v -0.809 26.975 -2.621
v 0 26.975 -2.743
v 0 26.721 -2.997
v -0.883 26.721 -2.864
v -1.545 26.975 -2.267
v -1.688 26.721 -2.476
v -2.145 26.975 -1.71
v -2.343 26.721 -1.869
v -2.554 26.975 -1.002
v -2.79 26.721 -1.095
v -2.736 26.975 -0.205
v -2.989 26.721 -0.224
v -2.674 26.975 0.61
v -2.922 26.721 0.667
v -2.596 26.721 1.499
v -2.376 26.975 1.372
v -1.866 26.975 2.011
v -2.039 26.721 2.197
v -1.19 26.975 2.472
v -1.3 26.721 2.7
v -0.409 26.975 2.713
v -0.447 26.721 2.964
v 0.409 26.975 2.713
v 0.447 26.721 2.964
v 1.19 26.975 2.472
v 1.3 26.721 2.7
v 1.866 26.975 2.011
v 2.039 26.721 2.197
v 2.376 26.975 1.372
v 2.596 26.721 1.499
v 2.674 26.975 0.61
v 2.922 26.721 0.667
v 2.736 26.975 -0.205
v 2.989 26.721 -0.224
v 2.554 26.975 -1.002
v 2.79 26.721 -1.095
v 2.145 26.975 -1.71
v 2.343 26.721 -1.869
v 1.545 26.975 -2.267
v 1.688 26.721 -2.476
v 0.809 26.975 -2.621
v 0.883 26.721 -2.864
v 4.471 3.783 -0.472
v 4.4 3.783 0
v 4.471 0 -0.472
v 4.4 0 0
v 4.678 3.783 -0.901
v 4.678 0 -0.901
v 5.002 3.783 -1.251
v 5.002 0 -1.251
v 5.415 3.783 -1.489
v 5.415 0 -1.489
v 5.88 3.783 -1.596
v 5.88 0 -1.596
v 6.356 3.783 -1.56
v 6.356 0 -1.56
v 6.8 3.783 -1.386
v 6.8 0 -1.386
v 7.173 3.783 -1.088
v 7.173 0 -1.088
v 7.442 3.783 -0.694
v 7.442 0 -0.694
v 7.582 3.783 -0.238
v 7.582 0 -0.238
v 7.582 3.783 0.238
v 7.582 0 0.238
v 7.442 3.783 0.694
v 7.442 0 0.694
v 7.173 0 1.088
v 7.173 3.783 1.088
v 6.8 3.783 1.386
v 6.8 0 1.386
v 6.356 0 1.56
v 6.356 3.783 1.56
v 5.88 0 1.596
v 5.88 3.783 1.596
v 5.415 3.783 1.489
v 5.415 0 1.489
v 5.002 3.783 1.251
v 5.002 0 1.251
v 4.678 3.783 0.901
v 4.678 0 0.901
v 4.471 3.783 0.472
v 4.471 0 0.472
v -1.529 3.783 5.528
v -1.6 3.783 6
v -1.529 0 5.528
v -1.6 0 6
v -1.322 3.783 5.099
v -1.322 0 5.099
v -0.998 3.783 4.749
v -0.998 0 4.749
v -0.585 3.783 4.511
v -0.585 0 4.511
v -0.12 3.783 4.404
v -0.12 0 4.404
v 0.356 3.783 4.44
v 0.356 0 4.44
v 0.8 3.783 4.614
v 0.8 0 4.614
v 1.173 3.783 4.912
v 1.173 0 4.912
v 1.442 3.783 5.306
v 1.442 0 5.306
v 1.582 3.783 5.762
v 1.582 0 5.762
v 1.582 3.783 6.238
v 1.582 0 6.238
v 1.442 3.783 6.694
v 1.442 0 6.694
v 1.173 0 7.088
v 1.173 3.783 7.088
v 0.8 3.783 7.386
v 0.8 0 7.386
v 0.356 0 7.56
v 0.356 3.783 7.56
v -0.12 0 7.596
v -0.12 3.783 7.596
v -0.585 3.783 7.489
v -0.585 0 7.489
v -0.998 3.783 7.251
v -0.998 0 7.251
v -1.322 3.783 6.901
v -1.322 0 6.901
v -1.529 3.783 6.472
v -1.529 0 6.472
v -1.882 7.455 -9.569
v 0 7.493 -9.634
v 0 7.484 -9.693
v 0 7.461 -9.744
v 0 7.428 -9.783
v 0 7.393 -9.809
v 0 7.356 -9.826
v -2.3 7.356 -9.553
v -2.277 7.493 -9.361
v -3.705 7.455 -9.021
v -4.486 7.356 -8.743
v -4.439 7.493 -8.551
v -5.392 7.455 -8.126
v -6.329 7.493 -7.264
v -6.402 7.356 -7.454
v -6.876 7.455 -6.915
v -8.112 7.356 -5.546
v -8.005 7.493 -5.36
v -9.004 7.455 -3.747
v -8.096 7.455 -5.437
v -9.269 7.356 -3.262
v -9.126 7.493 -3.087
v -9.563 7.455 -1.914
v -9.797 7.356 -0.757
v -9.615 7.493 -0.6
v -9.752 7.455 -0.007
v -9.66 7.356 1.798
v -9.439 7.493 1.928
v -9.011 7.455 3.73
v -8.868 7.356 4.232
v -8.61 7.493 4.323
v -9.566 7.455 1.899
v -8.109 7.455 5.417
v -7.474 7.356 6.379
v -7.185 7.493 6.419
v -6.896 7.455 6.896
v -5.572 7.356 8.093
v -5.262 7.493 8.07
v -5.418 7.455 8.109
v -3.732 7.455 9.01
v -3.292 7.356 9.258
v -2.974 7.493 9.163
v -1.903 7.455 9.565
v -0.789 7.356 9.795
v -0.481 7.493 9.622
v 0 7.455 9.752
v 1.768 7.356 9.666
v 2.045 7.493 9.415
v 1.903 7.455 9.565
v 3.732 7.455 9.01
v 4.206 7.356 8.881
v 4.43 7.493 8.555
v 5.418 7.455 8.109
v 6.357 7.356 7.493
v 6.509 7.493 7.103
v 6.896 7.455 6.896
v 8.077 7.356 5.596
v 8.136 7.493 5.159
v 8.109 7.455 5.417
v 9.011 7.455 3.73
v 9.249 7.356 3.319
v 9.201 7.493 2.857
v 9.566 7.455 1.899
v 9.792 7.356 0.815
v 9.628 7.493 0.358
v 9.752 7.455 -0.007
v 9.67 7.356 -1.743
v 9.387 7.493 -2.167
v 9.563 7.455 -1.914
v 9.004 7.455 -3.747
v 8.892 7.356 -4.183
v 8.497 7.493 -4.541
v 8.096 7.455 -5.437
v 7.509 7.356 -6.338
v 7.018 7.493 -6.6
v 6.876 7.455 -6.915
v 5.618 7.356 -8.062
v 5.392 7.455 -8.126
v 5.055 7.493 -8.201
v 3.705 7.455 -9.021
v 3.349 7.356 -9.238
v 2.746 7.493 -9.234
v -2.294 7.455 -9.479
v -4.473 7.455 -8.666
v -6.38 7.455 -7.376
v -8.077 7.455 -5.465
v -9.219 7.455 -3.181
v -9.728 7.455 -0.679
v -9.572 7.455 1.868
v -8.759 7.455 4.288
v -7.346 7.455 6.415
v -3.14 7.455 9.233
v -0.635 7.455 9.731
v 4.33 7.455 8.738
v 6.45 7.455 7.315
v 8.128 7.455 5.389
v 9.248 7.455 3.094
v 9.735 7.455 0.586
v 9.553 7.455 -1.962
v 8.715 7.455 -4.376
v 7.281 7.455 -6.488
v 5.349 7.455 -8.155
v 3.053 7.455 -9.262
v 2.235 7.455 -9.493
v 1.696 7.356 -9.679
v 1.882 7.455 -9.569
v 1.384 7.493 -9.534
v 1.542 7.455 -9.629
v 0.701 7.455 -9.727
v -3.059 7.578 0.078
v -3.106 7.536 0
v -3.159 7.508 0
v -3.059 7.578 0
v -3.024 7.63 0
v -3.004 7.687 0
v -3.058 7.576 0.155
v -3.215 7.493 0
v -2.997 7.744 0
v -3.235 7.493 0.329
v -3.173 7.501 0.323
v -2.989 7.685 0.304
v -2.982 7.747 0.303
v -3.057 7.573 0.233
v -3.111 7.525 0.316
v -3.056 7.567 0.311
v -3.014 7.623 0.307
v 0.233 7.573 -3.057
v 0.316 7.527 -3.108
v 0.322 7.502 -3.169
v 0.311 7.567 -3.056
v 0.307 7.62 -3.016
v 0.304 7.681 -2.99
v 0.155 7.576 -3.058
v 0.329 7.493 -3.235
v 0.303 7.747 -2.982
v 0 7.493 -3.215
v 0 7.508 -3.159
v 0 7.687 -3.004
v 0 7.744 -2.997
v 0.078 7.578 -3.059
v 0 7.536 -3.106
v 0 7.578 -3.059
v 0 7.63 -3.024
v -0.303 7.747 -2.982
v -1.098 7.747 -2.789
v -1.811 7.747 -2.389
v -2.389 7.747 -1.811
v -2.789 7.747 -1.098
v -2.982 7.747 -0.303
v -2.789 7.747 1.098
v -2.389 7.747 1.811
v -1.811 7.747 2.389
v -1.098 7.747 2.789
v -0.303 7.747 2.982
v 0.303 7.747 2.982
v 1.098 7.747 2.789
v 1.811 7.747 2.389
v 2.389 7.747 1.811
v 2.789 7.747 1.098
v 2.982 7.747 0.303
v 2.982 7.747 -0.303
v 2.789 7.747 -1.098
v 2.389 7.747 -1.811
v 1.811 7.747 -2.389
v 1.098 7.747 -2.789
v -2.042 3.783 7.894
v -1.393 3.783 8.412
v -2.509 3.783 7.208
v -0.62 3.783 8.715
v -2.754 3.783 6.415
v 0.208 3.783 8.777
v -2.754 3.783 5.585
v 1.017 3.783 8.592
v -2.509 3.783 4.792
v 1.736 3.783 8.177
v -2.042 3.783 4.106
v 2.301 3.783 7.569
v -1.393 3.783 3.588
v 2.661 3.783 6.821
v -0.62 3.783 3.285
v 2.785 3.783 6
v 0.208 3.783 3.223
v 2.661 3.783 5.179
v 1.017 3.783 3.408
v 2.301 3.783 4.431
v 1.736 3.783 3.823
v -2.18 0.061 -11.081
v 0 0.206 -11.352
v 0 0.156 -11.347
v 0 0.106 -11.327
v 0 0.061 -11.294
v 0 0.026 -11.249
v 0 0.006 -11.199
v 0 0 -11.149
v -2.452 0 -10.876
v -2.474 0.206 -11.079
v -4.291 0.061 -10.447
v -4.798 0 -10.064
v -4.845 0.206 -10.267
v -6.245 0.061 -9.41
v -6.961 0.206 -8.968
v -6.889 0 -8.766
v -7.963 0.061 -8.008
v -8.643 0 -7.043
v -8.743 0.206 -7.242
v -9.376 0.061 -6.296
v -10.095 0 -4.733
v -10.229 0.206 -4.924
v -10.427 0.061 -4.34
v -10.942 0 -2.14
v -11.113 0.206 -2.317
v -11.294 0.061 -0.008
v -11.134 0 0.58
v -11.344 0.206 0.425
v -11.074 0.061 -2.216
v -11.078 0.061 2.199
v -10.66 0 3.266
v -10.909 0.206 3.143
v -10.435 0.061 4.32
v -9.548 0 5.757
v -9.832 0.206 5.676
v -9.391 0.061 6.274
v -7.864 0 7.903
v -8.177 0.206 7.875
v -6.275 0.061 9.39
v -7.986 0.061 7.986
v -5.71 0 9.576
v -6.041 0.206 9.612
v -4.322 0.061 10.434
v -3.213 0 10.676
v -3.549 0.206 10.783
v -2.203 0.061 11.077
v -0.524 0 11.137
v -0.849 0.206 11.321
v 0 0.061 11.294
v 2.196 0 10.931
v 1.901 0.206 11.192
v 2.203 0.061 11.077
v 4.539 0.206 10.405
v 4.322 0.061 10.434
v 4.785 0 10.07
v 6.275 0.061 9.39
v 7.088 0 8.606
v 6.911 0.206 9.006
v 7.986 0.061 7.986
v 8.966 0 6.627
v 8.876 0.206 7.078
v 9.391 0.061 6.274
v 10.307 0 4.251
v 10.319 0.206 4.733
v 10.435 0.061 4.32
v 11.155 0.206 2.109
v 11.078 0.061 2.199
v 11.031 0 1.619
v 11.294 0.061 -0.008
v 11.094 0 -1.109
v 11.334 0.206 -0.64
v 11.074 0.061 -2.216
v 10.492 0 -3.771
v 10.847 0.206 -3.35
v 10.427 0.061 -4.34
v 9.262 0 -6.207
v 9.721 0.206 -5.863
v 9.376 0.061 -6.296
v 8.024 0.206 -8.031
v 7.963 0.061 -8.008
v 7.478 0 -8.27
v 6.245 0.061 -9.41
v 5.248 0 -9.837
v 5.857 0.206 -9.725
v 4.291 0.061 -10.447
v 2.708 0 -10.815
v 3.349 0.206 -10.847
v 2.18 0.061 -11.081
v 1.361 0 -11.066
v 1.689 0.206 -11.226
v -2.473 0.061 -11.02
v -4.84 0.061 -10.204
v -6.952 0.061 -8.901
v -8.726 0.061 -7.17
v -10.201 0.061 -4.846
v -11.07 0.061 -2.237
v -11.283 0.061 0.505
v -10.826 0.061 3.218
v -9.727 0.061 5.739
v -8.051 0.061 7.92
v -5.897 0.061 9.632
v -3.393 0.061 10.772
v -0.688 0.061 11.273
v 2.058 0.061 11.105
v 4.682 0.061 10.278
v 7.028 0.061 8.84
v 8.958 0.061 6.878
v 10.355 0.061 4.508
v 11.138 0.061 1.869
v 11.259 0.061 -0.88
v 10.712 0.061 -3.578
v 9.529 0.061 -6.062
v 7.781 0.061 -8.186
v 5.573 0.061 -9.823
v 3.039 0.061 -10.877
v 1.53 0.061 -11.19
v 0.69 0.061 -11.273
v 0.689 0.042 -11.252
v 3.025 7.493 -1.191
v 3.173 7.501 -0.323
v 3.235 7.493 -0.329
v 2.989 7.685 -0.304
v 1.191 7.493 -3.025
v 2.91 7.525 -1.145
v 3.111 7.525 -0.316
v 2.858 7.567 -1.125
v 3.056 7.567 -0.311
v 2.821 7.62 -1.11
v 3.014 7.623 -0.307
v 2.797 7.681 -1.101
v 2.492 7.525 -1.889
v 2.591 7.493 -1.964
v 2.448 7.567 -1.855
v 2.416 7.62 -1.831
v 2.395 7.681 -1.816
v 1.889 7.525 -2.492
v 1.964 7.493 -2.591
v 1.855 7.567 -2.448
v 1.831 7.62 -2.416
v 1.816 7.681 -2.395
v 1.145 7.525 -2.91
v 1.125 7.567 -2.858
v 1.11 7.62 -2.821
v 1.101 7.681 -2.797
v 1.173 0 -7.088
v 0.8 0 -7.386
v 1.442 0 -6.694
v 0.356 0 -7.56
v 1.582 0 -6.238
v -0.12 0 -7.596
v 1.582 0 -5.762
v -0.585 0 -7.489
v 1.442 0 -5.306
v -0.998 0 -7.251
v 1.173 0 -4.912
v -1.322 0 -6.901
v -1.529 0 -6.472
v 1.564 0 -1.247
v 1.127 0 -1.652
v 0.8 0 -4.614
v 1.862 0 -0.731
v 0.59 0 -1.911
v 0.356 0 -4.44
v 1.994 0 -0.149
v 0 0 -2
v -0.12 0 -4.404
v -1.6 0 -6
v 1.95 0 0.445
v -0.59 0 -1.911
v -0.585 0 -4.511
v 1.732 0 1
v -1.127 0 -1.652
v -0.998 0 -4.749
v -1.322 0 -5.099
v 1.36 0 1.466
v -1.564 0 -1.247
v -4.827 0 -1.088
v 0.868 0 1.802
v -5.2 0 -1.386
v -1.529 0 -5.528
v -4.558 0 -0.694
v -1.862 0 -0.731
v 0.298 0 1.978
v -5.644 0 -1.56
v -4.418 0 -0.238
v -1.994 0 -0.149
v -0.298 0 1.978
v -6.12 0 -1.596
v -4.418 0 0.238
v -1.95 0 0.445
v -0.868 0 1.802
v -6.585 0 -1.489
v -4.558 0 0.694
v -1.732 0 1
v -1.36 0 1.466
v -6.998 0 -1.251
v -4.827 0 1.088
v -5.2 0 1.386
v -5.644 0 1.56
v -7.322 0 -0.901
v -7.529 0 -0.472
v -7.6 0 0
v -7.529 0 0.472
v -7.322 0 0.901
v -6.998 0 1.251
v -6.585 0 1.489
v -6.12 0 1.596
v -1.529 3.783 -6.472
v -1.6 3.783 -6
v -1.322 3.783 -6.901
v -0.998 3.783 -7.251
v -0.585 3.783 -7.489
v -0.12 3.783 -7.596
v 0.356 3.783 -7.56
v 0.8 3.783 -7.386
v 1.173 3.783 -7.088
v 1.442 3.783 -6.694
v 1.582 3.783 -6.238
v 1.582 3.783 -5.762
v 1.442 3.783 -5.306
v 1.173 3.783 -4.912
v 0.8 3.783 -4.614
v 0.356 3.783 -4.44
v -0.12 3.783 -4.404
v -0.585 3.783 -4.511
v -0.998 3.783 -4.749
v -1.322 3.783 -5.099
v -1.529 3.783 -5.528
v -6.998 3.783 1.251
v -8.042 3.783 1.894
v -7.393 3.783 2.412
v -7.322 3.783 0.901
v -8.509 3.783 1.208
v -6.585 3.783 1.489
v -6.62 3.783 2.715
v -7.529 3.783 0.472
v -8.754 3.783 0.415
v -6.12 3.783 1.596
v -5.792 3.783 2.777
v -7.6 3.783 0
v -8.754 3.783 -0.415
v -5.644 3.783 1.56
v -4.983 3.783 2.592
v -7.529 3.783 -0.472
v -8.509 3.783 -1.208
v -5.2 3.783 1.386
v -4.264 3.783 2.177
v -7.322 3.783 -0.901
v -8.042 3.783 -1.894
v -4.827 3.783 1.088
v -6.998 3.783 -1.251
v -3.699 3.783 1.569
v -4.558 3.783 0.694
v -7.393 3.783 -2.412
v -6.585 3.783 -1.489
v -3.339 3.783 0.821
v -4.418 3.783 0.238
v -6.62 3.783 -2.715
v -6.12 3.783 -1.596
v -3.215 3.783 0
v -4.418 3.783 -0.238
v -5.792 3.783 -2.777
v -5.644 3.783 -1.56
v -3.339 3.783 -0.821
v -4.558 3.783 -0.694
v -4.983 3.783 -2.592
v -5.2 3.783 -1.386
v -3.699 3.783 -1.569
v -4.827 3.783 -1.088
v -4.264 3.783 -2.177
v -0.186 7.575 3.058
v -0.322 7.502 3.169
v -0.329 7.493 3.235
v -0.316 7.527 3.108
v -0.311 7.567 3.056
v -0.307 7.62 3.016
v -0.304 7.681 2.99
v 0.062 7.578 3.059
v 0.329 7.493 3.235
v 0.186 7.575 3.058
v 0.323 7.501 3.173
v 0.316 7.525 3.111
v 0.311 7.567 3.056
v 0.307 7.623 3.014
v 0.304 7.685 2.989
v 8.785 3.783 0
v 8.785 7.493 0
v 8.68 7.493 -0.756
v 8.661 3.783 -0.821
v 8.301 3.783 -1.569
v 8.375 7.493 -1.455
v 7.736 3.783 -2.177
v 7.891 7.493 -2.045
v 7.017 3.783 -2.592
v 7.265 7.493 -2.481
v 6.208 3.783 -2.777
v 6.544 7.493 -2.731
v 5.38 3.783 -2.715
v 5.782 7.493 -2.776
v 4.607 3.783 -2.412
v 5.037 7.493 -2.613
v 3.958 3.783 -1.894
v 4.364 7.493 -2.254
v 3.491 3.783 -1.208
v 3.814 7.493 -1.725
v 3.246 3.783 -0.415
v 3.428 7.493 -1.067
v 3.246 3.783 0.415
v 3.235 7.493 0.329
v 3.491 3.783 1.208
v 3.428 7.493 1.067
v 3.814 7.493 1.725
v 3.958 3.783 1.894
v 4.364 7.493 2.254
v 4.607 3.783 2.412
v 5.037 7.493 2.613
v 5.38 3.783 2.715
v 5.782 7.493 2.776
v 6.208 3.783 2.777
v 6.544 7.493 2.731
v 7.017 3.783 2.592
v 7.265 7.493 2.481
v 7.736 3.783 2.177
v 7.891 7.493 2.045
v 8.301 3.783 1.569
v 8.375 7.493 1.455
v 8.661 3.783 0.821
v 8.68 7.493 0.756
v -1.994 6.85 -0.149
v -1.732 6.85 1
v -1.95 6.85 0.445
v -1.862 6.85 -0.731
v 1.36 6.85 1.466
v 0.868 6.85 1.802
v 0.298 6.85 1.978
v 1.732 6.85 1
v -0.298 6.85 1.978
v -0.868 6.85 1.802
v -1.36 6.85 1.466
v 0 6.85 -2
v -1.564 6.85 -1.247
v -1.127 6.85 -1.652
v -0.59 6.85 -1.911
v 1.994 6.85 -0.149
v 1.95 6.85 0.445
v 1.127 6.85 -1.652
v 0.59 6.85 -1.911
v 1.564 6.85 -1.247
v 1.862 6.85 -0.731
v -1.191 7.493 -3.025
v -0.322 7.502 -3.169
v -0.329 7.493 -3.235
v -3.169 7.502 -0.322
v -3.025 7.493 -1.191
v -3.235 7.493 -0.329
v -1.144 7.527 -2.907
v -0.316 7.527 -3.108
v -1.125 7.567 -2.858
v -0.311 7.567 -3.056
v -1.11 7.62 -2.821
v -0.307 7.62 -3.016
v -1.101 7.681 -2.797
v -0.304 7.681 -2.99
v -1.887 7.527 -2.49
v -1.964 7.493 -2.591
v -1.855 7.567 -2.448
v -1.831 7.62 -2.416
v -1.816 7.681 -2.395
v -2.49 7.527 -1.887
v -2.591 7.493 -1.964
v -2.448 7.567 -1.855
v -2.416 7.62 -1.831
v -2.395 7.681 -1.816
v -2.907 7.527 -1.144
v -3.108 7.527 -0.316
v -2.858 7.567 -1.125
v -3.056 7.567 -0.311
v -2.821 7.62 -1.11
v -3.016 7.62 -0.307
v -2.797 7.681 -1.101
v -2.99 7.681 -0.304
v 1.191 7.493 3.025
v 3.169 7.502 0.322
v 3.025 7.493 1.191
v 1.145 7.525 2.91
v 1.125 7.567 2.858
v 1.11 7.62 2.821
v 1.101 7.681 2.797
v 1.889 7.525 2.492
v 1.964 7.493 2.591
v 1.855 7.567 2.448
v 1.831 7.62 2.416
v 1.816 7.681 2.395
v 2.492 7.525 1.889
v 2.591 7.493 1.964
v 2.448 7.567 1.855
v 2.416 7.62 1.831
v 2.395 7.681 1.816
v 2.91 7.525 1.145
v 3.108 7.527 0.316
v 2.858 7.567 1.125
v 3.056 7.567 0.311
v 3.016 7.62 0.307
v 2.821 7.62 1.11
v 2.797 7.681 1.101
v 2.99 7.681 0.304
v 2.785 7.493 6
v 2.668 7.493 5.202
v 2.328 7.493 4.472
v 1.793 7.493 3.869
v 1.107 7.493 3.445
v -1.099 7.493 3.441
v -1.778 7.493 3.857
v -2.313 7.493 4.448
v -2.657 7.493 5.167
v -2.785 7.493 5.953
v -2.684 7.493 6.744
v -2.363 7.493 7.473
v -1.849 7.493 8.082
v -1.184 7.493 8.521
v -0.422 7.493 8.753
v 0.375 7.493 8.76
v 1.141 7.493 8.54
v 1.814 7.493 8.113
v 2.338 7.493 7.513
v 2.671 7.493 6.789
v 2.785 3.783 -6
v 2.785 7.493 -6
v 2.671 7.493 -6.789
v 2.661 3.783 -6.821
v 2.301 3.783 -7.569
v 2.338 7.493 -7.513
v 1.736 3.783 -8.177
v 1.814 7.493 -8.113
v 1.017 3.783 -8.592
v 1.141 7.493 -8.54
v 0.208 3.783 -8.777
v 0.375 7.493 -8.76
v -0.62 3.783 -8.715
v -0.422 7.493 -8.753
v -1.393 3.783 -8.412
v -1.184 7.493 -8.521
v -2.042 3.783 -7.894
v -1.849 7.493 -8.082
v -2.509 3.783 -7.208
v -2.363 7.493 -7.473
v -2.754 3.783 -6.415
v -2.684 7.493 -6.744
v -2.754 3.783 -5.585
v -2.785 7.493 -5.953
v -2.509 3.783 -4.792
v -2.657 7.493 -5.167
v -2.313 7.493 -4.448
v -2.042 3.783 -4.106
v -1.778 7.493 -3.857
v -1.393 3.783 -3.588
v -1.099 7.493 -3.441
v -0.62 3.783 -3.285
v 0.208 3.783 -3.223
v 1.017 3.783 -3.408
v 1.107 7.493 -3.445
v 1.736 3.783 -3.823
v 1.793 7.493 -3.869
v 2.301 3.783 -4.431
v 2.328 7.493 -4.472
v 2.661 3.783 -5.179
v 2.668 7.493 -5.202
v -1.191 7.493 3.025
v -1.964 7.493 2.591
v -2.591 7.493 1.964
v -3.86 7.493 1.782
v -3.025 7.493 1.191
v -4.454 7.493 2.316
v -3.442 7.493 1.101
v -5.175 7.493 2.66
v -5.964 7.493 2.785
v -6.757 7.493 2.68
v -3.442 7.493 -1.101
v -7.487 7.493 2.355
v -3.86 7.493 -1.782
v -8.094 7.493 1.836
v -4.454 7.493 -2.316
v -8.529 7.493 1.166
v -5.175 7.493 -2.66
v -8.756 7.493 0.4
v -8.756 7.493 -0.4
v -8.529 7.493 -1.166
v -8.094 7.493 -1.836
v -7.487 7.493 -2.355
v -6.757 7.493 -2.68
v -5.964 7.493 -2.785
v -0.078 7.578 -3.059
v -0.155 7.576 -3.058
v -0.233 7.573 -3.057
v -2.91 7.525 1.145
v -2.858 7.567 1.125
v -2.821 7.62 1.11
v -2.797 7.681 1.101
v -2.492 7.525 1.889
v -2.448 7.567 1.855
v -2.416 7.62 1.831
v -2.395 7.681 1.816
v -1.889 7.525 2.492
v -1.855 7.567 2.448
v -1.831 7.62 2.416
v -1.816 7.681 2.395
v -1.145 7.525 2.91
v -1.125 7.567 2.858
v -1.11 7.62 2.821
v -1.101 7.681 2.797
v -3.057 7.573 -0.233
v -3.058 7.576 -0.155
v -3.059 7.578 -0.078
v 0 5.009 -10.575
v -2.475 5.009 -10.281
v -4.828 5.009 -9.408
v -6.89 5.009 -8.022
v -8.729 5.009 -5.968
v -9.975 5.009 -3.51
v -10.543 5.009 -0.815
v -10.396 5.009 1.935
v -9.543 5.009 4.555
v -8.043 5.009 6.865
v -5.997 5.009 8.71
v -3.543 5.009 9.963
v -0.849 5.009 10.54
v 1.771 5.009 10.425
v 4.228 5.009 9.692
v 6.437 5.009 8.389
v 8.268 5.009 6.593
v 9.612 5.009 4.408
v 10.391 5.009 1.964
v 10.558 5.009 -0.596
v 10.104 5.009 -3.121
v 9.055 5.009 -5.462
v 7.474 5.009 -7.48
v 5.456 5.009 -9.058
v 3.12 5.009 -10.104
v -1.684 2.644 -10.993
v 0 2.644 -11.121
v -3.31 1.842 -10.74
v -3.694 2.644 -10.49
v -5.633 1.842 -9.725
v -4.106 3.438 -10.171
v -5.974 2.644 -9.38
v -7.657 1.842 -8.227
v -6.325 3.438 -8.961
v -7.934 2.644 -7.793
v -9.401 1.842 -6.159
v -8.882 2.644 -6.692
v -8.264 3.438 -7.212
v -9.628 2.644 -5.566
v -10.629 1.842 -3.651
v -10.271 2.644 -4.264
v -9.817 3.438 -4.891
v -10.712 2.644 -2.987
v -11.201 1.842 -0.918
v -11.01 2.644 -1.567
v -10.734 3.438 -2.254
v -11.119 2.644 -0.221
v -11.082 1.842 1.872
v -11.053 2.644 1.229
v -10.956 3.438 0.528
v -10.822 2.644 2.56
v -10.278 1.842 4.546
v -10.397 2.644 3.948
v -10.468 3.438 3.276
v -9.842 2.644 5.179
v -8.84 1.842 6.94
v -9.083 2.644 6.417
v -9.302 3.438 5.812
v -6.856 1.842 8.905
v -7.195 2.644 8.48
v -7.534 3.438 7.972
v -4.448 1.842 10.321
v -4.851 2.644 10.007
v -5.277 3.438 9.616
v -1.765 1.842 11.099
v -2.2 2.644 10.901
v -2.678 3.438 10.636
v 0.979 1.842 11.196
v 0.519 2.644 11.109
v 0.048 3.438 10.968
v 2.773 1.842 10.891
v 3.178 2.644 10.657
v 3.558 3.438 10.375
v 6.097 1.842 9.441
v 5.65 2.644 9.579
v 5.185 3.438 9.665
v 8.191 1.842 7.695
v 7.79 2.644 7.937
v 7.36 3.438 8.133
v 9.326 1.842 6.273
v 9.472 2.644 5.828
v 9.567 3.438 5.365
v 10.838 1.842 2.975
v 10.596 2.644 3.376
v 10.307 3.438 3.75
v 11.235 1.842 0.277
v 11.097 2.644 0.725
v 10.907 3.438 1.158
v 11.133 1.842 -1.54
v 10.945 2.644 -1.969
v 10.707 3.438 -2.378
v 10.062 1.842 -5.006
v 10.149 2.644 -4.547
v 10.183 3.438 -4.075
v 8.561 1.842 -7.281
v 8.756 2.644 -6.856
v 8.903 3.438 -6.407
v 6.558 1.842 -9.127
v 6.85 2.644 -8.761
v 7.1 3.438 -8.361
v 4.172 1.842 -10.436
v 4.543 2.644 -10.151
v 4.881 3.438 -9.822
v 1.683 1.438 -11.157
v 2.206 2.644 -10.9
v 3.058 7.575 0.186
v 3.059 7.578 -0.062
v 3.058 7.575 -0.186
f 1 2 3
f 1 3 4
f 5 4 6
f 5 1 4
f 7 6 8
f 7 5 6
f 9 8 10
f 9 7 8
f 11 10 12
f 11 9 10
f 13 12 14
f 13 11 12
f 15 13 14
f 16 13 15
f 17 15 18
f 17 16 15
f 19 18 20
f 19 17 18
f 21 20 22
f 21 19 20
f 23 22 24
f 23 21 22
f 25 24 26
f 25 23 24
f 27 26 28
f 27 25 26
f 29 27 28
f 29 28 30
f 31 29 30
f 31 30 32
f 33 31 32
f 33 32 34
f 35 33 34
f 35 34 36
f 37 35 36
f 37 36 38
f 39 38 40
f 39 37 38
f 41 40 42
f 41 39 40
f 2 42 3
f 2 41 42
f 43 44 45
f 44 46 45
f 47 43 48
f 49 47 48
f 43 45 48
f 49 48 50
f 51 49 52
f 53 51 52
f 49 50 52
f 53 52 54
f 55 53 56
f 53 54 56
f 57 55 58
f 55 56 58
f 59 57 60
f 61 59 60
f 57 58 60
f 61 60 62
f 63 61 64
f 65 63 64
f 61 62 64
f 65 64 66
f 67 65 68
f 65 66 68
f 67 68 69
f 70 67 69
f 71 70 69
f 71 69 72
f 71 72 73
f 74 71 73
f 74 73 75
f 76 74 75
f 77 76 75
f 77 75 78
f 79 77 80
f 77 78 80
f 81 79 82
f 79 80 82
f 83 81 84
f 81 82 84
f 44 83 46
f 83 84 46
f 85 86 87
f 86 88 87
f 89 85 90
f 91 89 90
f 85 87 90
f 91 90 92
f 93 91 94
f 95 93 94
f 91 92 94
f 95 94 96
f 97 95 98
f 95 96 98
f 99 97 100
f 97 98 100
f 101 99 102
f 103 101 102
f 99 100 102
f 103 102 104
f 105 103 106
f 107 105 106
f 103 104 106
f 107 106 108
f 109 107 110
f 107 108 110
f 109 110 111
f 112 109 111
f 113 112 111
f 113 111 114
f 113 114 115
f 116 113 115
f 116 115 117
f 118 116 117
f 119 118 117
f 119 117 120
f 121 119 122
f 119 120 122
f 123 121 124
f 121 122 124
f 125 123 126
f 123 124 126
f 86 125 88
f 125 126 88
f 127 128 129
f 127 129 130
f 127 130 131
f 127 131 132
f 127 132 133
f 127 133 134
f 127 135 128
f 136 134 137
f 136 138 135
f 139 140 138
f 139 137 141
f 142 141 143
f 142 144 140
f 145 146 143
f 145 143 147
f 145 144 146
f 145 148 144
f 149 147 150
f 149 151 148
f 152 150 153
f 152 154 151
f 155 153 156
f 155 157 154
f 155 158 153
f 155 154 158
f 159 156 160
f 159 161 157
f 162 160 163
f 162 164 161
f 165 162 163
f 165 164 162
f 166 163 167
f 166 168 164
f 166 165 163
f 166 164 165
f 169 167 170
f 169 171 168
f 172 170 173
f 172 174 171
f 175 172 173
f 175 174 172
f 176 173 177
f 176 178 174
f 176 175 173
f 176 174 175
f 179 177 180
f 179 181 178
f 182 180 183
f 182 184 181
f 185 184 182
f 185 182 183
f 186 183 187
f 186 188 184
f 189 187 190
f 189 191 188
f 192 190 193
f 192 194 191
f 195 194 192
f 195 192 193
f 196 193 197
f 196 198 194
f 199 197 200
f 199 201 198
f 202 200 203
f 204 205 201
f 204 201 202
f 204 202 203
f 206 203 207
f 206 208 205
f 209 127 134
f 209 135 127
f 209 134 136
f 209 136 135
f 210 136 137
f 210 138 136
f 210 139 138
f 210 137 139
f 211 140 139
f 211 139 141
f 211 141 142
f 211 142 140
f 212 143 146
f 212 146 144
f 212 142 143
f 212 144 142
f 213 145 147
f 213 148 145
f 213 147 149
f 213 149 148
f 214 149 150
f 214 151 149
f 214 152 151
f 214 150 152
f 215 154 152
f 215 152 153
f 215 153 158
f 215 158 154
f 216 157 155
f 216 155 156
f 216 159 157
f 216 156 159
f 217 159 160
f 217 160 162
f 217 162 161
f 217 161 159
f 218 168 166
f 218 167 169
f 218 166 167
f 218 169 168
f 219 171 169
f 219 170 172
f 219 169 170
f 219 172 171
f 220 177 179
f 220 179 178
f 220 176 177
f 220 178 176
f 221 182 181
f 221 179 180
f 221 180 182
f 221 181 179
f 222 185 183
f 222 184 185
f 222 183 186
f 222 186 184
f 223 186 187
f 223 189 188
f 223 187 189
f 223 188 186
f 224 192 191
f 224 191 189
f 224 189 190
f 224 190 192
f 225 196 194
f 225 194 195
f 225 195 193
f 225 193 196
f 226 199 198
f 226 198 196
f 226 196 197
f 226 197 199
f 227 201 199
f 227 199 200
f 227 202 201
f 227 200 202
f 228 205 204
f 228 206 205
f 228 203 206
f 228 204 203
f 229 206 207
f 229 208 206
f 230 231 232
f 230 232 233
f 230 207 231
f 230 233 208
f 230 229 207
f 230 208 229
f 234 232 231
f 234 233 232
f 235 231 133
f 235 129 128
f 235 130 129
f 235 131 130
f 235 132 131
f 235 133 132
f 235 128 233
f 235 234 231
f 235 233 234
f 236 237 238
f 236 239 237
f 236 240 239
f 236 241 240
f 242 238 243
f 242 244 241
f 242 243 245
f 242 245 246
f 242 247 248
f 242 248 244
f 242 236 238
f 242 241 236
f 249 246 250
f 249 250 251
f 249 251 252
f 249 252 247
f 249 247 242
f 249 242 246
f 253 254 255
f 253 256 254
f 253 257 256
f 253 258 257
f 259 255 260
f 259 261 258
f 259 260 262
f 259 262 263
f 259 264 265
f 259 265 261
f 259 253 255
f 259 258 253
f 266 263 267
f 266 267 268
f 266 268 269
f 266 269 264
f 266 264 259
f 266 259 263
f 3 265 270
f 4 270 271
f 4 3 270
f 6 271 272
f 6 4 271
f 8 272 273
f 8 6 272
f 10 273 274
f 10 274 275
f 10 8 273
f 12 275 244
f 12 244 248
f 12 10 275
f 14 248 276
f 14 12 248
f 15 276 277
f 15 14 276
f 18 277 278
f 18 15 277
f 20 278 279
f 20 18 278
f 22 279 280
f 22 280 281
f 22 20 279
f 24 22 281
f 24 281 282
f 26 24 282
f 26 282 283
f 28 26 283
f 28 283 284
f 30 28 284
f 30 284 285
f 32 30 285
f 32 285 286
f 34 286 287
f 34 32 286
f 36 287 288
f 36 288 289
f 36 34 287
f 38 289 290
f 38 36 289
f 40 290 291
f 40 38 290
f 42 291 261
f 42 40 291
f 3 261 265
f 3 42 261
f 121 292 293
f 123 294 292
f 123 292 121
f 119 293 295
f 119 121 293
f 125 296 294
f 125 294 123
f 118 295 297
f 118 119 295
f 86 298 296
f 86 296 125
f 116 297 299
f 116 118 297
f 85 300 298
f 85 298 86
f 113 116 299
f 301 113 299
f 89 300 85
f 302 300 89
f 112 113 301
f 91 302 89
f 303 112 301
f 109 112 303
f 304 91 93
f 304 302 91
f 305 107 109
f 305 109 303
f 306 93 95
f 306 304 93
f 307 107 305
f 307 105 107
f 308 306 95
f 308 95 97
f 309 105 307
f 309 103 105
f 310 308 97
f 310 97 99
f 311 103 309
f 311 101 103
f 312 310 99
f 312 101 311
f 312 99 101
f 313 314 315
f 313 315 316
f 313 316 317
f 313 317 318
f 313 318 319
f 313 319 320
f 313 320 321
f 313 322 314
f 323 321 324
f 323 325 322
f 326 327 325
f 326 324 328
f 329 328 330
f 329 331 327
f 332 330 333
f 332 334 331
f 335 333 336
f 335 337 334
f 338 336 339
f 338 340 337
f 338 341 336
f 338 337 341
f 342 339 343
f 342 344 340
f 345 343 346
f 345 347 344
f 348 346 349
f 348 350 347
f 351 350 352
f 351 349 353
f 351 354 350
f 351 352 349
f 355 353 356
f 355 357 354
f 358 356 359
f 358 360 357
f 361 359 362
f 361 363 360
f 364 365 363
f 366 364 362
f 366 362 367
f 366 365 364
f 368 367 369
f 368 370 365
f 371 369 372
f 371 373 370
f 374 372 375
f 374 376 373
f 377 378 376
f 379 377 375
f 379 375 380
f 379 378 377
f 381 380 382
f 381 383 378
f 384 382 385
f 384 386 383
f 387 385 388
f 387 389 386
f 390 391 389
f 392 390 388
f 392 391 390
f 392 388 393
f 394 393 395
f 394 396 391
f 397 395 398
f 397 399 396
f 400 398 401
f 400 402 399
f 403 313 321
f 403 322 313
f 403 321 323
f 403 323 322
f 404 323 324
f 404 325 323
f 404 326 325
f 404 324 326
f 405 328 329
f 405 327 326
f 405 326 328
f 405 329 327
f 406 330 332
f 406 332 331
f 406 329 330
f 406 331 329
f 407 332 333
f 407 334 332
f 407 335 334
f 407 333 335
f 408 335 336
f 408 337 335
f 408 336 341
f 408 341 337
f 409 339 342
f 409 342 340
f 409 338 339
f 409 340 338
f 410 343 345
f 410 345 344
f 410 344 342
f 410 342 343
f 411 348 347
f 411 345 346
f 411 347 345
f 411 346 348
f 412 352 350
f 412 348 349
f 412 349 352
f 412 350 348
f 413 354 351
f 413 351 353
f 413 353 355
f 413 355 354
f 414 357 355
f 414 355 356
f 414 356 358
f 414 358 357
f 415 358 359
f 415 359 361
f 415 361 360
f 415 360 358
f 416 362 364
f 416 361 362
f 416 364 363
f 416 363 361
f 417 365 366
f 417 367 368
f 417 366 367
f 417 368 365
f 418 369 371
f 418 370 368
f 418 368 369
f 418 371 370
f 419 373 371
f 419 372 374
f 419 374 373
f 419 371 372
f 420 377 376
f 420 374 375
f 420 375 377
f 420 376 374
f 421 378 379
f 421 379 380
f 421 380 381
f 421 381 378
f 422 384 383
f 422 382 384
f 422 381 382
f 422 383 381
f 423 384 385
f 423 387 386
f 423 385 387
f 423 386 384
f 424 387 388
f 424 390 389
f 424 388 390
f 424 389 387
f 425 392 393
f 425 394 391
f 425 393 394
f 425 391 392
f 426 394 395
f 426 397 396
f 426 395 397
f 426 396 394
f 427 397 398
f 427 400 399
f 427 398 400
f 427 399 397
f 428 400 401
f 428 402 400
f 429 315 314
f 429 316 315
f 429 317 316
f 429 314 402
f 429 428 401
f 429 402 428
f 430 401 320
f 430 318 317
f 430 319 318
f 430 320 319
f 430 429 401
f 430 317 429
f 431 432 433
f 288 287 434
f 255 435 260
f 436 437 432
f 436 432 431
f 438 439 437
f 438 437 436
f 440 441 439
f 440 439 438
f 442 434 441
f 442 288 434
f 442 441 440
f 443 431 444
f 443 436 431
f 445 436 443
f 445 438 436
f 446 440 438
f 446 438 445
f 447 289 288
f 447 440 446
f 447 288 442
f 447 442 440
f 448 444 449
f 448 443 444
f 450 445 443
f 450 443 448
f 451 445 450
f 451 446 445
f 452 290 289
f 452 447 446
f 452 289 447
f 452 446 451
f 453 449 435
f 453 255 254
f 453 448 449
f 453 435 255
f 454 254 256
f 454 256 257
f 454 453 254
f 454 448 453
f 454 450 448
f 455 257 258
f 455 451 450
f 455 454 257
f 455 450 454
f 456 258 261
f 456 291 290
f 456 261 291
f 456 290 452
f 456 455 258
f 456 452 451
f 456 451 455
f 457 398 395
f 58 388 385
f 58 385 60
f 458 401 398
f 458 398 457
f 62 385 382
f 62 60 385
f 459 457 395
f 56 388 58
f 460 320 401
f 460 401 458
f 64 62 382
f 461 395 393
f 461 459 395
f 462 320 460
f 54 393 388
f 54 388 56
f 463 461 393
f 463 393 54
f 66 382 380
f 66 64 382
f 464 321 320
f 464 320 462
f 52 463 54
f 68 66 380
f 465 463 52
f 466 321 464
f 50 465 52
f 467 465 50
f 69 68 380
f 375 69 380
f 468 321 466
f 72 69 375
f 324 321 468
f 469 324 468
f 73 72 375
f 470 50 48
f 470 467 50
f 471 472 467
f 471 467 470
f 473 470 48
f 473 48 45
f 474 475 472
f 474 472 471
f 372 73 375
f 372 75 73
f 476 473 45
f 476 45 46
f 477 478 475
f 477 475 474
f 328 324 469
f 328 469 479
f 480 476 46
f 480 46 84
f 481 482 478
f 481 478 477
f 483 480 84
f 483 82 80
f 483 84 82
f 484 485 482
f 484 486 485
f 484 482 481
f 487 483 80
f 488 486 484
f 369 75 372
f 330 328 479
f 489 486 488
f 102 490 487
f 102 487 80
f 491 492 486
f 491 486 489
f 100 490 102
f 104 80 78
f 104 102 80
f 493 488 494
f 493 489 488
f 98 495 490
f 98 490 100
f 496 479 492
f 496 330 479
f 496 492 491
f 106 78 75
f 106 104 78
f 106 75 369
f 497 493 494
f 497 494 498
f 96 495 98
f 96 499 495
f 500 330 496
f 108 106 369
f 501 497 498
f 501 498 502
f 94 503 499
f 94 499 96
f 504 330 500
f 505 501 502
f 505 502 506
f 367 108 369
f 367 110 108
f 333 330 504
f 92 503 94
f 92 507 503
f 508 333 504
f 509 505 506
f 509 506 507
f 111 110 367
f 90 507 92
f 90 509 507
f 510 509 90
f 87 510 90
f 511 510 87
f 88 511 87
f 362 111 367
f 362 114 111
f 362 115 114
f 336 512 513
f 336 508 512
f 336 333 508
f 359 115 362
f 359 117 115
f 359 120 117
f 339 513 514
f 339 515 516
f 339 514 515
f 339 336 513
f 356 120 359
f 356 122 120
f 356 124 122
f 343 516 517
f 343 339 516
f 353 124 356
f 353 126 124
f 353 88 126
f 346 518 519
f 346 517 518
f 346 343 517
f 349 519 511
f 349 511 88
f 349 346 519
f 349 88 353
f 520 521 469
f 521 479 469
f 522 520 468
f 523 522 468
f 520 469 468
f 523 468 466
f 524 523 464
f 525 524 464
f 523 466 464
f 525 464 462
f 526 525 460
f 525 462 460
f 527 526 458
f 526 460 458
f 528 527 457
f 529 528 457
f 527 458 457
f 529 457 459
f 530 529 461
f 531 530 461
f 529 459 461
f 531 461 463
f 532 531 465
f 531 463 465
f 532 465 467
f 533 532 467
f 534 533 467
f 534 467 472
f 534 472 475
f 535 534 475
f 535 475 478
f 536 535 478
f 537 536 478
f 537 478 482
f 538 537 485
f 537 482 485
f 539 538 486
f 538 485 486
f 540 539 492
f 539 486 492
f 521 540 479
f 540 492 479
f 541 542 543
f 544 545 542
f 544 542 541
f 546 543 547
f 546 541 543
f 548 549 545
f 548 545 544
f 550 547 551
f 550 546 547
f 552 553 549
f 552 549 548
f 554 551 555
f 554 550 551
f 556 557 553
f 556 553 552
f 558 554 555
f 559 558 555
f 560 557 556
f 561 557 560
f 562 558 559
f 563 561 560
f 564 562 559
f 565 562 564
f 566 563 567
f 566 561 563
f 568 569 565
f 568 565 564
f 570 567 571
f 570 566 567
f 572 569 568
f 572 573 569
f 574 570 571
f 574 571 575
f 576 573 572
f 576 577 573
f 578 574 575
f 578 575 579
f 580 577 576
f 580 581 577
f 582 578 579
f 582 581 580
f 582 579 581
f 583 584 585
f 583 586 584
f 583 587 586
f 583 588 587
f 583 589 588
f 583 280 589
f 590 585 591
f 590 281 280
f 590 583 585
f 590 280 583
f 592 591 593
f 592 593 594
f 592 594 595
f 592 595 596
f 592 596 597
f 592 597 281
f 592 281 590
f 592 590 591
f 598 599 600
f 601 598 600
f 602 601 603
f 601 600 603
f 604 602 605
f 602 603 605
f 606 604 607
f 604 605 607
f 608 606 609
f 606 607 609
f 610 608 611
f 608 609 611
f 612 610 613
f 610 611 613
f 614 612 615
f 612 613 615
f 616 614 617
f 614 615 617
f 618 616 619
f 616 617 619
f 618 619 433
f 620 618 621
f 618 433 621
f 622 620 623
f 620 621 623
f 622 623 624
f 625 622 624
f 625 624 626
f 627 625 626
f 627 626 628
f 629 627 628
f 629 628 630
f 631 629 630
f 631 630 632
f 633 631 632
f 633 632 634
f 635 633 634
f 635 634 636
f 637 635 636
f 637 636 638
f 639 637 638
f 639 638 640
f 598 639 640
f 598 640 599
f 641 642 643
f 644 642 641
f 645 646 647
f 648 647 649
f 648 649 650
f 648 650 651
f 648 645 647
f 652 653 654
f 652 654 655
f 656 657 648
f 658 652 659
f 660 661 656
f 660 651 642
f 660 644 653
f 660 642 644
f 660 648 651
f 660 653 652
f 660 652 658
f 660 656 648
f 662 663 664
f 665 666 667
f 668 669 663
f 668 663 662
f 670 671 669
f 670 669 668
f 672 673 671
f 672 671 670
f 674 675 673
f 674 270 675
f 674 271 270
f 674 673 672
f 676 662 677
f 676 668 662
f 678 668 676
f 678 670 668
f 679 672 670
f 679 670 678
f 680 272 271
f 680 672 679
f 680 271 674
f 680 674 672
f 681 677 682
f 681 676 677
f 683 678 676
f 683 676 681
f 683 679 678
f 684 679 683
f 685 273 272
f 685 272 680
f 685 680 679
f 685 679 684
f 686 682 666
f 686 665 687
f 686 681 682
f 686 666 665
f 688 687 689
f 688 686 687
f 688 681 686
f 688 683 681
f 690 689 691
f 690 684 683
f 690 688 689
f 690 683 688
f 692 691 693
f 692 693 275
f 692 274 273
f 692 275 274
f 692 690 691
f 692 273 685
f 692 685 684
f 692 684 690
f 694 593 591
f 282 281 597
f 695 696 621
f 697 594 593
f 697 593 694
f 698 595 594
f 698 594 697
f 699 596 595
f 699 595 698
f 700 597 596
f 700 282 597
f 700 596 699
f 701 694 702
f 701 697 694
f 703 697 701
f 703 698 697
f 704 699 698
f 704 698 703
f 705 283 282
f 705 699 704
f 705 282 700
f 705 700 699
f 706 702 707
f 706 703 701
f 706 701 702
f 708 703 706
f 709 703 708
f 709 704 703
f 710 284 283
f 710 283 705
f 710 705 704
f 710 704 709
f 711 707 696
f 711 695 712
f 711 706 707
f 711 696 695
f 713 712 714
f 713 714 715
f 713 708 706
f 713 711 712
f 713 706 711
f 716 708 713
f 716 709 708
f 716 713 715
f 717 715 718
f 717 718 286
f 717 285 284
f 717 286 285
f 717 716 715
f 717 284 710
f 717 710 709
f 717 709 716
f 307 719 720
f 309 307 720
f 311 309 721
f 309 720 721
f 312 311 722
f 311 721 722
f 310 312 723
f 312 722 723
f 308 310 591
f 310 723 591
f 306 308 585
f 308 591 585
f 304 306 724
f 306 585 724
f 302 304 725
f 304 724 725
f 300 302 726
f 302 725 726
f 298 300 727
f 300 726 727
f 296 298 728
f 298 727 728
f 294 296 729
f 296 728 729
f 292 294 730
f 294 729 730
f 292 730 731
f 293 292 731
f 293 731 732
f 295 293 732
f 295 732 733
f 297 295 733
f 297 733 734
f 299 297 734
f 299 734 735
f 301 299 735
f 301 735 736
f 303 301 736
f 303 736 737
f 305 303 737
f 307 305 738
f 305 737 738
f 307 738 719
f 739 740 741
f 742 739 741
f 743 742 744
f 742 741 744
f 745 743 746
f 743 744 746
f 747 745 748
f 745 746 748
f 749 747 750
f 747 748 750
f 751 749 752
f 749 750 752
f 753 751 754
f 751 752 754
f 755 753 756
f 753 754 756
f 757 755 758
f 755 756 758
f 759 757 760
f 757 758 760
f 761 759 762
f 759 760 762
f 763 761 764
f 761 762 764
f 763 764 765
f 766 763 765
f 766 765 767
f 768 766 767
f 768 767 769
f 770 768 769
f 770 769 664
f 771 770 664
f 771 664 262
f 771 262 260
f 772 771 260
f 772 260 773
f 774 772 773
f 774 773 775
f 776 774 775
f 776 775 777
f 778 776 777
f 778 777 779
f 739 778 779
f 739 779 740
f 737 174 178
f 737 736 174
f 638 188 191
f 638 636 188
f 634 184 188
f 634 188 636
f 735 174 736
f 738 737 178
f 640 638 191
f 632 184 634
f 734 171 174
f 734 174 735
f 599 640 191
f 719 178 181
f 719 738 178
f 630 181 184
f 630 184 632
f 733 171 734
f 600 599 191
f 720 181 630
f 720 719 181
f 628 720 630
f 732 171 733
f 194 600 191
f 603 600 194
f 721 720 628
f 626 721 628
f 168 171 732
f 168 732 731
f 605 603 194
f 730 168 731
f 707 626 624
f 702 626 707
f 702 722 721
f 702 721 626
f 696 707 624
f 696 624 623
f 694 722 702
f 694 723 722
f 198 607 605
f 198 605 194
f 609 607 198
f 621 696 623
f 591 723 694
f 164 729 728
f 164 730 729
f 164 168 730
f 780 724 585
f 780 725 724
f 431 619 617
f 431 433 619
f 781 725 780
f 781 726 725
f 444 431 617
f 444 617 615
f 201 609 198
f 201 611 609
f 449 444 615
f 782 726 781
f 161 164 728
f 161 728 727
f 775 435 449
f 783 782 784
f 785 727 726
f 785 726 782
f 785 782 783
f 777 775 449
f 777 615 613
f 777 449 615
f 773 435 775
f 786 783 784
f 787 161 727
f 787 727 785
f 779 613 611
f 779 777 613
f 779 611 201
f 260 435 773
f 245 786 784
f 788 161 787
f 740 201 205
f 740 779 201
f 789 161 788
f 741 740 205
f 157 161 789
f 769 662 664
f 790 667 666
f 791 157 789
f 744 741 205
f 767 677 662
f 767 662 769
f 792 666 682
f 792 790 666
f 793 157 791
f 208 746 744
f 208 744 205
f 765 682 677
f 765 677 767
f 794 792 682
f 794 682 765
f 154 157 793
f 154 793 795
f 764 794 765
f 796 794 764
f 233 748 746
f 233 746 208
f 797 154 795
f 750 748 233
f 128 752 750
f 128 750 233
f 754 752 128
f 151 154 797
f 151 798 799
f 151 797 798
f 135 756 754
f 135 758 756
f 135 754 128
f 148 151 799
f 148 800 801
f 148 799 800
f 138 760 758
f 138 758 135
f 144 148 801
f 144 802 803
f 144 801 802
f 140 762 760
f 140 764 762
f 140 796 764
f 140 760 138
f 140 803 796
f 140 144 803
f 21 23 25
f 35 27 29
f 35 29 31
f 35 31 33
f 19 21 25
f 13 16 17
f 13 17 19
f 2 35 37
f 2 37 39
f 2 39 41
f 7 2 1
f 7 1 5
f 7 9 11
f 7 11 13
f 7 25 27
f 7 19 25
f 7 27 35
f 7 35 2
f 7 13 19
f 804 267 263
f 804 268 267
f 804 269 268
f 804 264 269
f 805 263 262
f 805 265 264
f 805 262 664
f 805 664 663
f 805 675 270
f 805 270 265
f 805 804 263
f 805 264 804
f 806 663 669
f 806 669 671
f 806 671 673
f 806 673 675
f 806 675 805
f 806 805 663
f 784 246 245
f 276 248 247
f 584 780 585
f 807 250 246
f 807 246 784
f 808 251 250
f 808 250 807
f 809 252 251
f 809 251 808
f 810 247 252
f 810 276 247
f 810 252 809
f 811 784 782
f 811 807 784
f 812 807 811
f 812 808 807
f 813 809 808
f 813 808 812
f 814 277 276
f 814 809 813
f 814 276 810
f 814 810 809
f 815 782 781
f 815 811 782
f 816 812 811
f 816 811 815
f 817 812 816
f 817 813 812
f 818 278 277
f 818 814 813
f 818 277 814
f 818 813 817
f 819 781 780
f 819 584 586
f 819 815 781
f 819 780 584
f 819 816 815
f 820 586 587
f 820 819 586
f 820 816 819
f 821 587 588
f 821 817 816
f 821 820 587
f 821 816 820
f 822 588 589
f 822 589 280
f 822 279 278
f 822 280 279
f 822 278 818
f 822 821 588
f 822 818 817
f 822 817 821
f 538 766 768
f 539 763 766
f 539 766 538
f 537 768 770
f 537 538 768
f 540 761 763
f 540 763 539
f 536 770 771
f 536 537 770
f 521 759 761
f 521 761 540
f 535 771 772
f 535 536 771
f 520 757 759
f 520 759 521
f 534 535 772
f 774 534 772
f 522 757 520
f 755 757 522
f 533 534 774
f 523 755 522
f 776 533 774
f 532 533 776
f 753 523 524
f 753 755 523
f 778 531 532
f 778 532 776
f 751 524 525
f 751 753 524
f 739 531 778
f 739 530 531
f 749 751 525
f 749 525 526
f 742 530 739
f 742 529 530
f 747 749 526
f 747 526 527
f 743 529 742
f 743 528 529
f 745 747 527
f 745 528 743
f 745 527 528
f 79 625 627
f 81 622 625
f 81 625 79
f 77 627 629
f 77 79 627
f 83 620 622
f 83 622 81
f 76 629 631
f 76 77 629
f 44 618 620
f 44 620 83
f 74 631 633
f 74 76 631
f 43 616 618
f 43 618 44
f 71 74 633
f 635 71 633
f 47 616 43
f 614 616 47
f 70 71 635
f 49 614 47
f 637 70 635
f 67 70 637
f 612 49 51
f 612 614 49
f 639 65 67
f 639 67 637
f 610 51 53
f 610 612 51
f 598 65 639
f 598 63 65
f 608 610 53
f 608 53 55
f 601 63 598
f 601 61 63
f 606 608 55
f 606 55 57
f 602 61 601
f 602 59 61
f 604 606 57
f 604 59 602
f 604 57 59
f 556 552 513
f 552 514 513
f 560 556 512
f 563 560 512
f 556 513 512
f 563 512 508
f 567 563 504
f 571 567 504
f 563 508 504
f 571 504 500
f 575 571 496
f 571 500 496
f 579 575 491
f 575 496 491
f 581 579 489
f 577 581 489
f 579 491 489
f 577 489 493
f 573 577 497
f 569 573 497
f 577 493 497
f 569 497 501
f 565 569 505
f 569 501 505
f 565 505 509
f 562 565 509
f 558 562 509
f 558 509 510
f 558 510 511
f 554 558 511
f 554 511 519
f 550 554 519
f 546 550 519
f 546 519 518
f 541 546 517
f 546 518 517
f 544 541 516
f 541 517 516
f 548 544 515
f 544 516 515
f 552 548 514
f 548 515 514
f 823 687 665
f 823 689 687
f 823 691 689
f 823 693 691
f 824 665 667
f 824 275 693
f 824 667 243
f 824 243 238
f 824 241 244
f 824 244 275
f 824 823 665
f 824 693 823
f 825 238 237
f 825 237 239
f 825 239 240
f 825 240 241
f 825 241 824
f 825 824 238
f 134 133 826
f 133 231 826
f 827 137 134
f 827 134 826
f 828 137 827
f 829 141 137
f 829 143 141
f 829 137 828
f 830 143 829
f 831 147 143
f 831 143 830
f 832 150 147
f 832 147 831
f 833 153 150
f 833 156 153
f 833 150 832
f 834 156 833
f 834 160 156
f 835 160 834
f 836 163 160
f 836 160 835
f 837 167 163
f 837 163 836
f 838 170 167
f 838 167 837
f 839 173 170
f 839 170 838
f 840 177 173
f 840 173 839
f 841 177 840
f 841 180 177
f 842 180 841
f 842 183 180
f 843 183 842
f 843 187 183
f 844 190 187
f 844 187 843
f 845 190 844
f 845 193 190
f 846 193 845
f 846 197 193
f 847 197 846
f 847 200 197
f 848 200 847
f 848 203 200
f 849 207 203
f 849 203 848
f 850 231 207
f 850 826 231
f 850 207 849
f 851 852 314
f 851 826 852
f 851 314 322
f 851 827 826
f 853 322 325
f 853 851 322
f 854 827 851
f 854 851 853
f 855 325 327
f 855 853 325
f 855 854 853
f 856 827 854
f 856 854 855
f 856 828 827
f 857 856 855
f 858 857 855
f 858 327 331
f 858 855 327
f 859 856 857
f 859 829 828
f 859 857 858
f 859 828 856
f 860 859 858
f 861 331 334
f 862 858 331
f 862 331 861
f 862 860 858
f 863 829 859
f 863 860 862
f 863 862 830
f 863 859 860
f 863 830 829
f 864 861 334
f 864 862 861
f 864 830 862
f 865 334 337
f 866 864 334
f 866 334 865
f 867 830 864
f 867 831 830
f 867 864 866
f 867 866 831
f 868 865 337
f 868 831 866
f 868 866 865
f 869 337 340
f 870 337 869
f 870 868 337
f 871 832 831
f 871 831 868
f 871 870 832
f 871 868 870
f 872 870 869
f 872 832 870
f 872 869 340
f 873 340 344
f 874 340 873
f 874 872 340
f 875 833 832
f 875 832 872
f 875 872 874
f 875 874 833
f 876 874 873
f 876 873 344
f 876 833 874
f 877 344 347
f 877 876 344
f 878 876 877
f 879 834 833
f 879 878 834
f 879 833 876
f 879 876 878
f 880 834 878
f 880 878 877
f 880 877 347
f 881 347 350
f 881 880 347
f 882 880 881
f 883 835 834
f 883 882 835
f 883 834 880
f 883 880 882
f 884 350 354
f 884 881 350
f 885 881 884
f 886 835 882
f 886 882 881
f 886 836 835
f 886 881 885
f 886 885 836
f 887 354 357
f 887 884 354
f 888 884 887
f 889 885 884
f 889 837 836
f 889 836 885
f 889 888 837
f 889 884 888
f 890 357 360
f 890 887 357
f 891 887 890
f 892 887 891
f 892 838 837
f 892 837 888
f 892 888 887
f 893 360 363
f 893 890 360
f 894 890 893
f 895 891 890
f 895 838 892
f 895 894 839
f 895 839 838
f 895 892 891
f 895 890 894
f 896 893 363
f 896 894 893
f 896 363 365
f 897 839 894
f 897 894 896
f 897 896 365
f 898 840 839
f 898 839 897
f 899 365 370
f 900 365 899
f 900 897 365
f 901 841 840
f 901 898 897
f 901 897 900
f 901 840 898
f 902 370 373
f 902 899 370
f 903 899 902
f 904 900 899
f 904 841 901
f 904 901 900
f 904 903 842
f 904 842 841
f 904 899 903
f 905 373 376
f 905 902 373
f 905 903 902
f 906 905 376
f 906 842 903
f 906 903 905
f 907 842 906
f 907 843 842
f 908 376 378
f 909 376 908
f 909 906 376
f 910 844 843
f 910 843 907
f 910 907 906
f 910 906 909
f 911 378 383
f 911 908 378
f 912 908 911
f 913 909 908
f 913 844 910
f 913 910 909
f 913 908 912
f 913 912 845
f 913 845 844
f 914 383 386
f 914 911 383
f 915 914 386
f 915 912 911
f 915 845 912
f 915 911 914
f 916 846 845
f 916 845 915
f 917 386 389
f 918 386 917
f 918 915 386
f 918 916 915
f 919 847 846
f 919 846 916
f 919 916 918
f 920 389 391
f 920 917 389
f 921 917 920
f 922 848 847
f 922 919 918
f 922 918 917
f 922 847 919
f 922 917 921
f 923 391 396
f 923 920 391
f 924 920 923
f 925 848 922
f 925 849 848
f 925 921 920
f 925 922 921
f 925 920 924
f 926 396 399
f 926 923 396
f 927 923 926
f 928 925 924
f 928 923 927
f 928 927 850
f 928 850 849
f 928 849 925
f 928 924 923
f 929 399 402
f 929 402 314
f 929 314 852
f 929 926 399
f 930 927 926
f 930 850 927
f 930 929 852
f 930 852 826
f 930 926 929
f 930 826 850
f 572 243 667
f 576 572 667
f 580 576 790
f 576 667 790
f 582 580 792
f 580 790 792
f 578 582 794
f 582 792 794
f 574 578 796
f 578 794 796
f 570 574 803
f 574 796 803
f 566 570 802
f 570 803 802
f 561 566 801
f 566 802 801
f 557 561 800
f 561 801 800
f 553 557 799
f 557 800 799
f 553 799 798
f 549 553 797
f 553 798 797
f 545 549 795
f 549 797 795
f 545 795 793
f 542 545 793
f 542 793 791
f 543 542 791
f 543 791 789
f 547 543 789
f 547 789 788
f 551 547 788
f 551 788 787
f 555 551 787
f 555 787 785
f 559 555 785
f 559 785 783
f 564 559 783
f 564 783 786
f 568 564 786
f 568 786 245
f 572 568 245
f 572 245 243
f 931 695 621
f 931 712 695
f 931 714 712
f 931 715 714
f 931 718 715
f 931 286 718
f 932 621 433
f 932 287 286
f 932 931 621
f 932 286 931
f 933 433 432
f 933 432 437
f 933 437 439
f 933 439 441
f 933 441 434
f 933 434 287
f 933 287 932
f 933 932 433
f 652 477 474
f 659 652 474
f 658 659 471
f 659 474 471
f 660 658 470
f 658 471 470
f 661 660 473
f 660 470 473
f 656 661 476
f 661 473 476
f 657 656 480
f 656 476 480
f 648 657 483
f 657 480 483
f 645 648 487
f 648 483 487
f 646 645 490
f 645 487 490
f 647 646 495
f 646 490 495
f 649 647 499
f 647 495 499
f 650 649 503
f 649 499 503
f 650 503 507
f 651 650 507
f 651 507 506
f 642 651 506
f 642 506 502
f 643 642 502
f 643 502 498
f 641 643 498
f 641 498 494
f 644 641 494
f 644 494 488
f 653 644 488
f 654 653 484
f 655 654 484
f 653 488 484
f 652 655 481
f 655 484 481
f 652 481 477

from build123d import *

# Parameters (mm, degrees)
CBORE_FOR_M3_SHCS1_D           = 3.2
CBORE_FOR_M3_SHCS1_CBORE_D     = 5.57
CBORE_FOR_M3_SHCS1_CBORE_DEPTH = 3.71
SKETCH6_R                      = 2
CUT_EXTRUDE1_DEPTH             = 6.85
FILLET1_R                      = 0.254
CHAMFER1_SIZE                  = 0.254
FILLET2_R                      = 0.2032


with BuildPart() as part:
    # Sketch2 → Revolve1 (revolve)
    with BuildSketch(Plane.XY, mode=Mode.PRIVATE) as revolve1_sk:
        with BuildLine():
            Line((0, 0), (11.3538, 0))
            add(Edge.make_bspline(
                [(11.3538, 0), (11.3538, 2.621582021), (10.633364827, 5.02311439), (9.779, 7.493)],
                knots=[0, 0, 0, 0, 1, 1, 1, 1], degree=3))
            Line((9.779, 7.493), (2.9972, 7.493))
            Line((2.9972, 7.493), (2.9972, 26.9748))
            Line((2.9972, 26.9748), (0, 26.9748))
            Line((0, 26.9748), (0, 0))
        make_face()
    revolve(revolve1_sk.sketch.rotate(Axis((0, 0, 0), (0, 1, 0)), 90), axis=Axis((0, 0, 0), (0, 1, 0)))

    # CBORE for M3 SHCS1 (through all)
    with Locations(Plane(origin=(0, 7.493, 0), x_dir=(1, 0, 0), z_dir=(0, 1, 0))):
        with Locations((0, 6), (6, 0), (0, -6), (-6, 0)):
            CounterBoreHole(CBORE_FOR_M3_SHCS1_D / 2, CBORE_FOR_M3_SHCS1_CBORE_D / 2, CBORE_FOR_M3_SHCS1_CBORE_DEPTH)

    # Sketch6 → Cut-Extrude1 (cut)
    with BuildSketch(Plane.XZ):
        with Locations(Location((0, 0, 0), (0, 0, 270))):
            Circle(SKETCH6_R)
    extrude(amount=-CUT_EXTRUDE1_DEPTH, mode=Mode.SUBTRACT)

    # Fillet1
    fillet1_edges = [part.edges().sort_by_distance(p)[0] for p in [
        (0, 7.493, 2.9972),
    ]]
    fillet(fillet1_edges, radius=FILLET1_R)

    # Chamfer1
    chamfer1_edges = [part.edges().sort_by_distance(p)[0] for p in [
        (0, 26.9748, 2.9972),
    ]]
    chamfer(chamfer1_edges, length=CHAMFER1_SIZE)

    # Fillet2
    fillet2_edges = [part.edges().sort_by_distance(p)[0] for p in [
        (0, 0, 11.3538),
        (0, 7.493, 9.779),
    ]]
    fillet(fillet2_edges, radius=FILLET2_R)


solid = part.part
